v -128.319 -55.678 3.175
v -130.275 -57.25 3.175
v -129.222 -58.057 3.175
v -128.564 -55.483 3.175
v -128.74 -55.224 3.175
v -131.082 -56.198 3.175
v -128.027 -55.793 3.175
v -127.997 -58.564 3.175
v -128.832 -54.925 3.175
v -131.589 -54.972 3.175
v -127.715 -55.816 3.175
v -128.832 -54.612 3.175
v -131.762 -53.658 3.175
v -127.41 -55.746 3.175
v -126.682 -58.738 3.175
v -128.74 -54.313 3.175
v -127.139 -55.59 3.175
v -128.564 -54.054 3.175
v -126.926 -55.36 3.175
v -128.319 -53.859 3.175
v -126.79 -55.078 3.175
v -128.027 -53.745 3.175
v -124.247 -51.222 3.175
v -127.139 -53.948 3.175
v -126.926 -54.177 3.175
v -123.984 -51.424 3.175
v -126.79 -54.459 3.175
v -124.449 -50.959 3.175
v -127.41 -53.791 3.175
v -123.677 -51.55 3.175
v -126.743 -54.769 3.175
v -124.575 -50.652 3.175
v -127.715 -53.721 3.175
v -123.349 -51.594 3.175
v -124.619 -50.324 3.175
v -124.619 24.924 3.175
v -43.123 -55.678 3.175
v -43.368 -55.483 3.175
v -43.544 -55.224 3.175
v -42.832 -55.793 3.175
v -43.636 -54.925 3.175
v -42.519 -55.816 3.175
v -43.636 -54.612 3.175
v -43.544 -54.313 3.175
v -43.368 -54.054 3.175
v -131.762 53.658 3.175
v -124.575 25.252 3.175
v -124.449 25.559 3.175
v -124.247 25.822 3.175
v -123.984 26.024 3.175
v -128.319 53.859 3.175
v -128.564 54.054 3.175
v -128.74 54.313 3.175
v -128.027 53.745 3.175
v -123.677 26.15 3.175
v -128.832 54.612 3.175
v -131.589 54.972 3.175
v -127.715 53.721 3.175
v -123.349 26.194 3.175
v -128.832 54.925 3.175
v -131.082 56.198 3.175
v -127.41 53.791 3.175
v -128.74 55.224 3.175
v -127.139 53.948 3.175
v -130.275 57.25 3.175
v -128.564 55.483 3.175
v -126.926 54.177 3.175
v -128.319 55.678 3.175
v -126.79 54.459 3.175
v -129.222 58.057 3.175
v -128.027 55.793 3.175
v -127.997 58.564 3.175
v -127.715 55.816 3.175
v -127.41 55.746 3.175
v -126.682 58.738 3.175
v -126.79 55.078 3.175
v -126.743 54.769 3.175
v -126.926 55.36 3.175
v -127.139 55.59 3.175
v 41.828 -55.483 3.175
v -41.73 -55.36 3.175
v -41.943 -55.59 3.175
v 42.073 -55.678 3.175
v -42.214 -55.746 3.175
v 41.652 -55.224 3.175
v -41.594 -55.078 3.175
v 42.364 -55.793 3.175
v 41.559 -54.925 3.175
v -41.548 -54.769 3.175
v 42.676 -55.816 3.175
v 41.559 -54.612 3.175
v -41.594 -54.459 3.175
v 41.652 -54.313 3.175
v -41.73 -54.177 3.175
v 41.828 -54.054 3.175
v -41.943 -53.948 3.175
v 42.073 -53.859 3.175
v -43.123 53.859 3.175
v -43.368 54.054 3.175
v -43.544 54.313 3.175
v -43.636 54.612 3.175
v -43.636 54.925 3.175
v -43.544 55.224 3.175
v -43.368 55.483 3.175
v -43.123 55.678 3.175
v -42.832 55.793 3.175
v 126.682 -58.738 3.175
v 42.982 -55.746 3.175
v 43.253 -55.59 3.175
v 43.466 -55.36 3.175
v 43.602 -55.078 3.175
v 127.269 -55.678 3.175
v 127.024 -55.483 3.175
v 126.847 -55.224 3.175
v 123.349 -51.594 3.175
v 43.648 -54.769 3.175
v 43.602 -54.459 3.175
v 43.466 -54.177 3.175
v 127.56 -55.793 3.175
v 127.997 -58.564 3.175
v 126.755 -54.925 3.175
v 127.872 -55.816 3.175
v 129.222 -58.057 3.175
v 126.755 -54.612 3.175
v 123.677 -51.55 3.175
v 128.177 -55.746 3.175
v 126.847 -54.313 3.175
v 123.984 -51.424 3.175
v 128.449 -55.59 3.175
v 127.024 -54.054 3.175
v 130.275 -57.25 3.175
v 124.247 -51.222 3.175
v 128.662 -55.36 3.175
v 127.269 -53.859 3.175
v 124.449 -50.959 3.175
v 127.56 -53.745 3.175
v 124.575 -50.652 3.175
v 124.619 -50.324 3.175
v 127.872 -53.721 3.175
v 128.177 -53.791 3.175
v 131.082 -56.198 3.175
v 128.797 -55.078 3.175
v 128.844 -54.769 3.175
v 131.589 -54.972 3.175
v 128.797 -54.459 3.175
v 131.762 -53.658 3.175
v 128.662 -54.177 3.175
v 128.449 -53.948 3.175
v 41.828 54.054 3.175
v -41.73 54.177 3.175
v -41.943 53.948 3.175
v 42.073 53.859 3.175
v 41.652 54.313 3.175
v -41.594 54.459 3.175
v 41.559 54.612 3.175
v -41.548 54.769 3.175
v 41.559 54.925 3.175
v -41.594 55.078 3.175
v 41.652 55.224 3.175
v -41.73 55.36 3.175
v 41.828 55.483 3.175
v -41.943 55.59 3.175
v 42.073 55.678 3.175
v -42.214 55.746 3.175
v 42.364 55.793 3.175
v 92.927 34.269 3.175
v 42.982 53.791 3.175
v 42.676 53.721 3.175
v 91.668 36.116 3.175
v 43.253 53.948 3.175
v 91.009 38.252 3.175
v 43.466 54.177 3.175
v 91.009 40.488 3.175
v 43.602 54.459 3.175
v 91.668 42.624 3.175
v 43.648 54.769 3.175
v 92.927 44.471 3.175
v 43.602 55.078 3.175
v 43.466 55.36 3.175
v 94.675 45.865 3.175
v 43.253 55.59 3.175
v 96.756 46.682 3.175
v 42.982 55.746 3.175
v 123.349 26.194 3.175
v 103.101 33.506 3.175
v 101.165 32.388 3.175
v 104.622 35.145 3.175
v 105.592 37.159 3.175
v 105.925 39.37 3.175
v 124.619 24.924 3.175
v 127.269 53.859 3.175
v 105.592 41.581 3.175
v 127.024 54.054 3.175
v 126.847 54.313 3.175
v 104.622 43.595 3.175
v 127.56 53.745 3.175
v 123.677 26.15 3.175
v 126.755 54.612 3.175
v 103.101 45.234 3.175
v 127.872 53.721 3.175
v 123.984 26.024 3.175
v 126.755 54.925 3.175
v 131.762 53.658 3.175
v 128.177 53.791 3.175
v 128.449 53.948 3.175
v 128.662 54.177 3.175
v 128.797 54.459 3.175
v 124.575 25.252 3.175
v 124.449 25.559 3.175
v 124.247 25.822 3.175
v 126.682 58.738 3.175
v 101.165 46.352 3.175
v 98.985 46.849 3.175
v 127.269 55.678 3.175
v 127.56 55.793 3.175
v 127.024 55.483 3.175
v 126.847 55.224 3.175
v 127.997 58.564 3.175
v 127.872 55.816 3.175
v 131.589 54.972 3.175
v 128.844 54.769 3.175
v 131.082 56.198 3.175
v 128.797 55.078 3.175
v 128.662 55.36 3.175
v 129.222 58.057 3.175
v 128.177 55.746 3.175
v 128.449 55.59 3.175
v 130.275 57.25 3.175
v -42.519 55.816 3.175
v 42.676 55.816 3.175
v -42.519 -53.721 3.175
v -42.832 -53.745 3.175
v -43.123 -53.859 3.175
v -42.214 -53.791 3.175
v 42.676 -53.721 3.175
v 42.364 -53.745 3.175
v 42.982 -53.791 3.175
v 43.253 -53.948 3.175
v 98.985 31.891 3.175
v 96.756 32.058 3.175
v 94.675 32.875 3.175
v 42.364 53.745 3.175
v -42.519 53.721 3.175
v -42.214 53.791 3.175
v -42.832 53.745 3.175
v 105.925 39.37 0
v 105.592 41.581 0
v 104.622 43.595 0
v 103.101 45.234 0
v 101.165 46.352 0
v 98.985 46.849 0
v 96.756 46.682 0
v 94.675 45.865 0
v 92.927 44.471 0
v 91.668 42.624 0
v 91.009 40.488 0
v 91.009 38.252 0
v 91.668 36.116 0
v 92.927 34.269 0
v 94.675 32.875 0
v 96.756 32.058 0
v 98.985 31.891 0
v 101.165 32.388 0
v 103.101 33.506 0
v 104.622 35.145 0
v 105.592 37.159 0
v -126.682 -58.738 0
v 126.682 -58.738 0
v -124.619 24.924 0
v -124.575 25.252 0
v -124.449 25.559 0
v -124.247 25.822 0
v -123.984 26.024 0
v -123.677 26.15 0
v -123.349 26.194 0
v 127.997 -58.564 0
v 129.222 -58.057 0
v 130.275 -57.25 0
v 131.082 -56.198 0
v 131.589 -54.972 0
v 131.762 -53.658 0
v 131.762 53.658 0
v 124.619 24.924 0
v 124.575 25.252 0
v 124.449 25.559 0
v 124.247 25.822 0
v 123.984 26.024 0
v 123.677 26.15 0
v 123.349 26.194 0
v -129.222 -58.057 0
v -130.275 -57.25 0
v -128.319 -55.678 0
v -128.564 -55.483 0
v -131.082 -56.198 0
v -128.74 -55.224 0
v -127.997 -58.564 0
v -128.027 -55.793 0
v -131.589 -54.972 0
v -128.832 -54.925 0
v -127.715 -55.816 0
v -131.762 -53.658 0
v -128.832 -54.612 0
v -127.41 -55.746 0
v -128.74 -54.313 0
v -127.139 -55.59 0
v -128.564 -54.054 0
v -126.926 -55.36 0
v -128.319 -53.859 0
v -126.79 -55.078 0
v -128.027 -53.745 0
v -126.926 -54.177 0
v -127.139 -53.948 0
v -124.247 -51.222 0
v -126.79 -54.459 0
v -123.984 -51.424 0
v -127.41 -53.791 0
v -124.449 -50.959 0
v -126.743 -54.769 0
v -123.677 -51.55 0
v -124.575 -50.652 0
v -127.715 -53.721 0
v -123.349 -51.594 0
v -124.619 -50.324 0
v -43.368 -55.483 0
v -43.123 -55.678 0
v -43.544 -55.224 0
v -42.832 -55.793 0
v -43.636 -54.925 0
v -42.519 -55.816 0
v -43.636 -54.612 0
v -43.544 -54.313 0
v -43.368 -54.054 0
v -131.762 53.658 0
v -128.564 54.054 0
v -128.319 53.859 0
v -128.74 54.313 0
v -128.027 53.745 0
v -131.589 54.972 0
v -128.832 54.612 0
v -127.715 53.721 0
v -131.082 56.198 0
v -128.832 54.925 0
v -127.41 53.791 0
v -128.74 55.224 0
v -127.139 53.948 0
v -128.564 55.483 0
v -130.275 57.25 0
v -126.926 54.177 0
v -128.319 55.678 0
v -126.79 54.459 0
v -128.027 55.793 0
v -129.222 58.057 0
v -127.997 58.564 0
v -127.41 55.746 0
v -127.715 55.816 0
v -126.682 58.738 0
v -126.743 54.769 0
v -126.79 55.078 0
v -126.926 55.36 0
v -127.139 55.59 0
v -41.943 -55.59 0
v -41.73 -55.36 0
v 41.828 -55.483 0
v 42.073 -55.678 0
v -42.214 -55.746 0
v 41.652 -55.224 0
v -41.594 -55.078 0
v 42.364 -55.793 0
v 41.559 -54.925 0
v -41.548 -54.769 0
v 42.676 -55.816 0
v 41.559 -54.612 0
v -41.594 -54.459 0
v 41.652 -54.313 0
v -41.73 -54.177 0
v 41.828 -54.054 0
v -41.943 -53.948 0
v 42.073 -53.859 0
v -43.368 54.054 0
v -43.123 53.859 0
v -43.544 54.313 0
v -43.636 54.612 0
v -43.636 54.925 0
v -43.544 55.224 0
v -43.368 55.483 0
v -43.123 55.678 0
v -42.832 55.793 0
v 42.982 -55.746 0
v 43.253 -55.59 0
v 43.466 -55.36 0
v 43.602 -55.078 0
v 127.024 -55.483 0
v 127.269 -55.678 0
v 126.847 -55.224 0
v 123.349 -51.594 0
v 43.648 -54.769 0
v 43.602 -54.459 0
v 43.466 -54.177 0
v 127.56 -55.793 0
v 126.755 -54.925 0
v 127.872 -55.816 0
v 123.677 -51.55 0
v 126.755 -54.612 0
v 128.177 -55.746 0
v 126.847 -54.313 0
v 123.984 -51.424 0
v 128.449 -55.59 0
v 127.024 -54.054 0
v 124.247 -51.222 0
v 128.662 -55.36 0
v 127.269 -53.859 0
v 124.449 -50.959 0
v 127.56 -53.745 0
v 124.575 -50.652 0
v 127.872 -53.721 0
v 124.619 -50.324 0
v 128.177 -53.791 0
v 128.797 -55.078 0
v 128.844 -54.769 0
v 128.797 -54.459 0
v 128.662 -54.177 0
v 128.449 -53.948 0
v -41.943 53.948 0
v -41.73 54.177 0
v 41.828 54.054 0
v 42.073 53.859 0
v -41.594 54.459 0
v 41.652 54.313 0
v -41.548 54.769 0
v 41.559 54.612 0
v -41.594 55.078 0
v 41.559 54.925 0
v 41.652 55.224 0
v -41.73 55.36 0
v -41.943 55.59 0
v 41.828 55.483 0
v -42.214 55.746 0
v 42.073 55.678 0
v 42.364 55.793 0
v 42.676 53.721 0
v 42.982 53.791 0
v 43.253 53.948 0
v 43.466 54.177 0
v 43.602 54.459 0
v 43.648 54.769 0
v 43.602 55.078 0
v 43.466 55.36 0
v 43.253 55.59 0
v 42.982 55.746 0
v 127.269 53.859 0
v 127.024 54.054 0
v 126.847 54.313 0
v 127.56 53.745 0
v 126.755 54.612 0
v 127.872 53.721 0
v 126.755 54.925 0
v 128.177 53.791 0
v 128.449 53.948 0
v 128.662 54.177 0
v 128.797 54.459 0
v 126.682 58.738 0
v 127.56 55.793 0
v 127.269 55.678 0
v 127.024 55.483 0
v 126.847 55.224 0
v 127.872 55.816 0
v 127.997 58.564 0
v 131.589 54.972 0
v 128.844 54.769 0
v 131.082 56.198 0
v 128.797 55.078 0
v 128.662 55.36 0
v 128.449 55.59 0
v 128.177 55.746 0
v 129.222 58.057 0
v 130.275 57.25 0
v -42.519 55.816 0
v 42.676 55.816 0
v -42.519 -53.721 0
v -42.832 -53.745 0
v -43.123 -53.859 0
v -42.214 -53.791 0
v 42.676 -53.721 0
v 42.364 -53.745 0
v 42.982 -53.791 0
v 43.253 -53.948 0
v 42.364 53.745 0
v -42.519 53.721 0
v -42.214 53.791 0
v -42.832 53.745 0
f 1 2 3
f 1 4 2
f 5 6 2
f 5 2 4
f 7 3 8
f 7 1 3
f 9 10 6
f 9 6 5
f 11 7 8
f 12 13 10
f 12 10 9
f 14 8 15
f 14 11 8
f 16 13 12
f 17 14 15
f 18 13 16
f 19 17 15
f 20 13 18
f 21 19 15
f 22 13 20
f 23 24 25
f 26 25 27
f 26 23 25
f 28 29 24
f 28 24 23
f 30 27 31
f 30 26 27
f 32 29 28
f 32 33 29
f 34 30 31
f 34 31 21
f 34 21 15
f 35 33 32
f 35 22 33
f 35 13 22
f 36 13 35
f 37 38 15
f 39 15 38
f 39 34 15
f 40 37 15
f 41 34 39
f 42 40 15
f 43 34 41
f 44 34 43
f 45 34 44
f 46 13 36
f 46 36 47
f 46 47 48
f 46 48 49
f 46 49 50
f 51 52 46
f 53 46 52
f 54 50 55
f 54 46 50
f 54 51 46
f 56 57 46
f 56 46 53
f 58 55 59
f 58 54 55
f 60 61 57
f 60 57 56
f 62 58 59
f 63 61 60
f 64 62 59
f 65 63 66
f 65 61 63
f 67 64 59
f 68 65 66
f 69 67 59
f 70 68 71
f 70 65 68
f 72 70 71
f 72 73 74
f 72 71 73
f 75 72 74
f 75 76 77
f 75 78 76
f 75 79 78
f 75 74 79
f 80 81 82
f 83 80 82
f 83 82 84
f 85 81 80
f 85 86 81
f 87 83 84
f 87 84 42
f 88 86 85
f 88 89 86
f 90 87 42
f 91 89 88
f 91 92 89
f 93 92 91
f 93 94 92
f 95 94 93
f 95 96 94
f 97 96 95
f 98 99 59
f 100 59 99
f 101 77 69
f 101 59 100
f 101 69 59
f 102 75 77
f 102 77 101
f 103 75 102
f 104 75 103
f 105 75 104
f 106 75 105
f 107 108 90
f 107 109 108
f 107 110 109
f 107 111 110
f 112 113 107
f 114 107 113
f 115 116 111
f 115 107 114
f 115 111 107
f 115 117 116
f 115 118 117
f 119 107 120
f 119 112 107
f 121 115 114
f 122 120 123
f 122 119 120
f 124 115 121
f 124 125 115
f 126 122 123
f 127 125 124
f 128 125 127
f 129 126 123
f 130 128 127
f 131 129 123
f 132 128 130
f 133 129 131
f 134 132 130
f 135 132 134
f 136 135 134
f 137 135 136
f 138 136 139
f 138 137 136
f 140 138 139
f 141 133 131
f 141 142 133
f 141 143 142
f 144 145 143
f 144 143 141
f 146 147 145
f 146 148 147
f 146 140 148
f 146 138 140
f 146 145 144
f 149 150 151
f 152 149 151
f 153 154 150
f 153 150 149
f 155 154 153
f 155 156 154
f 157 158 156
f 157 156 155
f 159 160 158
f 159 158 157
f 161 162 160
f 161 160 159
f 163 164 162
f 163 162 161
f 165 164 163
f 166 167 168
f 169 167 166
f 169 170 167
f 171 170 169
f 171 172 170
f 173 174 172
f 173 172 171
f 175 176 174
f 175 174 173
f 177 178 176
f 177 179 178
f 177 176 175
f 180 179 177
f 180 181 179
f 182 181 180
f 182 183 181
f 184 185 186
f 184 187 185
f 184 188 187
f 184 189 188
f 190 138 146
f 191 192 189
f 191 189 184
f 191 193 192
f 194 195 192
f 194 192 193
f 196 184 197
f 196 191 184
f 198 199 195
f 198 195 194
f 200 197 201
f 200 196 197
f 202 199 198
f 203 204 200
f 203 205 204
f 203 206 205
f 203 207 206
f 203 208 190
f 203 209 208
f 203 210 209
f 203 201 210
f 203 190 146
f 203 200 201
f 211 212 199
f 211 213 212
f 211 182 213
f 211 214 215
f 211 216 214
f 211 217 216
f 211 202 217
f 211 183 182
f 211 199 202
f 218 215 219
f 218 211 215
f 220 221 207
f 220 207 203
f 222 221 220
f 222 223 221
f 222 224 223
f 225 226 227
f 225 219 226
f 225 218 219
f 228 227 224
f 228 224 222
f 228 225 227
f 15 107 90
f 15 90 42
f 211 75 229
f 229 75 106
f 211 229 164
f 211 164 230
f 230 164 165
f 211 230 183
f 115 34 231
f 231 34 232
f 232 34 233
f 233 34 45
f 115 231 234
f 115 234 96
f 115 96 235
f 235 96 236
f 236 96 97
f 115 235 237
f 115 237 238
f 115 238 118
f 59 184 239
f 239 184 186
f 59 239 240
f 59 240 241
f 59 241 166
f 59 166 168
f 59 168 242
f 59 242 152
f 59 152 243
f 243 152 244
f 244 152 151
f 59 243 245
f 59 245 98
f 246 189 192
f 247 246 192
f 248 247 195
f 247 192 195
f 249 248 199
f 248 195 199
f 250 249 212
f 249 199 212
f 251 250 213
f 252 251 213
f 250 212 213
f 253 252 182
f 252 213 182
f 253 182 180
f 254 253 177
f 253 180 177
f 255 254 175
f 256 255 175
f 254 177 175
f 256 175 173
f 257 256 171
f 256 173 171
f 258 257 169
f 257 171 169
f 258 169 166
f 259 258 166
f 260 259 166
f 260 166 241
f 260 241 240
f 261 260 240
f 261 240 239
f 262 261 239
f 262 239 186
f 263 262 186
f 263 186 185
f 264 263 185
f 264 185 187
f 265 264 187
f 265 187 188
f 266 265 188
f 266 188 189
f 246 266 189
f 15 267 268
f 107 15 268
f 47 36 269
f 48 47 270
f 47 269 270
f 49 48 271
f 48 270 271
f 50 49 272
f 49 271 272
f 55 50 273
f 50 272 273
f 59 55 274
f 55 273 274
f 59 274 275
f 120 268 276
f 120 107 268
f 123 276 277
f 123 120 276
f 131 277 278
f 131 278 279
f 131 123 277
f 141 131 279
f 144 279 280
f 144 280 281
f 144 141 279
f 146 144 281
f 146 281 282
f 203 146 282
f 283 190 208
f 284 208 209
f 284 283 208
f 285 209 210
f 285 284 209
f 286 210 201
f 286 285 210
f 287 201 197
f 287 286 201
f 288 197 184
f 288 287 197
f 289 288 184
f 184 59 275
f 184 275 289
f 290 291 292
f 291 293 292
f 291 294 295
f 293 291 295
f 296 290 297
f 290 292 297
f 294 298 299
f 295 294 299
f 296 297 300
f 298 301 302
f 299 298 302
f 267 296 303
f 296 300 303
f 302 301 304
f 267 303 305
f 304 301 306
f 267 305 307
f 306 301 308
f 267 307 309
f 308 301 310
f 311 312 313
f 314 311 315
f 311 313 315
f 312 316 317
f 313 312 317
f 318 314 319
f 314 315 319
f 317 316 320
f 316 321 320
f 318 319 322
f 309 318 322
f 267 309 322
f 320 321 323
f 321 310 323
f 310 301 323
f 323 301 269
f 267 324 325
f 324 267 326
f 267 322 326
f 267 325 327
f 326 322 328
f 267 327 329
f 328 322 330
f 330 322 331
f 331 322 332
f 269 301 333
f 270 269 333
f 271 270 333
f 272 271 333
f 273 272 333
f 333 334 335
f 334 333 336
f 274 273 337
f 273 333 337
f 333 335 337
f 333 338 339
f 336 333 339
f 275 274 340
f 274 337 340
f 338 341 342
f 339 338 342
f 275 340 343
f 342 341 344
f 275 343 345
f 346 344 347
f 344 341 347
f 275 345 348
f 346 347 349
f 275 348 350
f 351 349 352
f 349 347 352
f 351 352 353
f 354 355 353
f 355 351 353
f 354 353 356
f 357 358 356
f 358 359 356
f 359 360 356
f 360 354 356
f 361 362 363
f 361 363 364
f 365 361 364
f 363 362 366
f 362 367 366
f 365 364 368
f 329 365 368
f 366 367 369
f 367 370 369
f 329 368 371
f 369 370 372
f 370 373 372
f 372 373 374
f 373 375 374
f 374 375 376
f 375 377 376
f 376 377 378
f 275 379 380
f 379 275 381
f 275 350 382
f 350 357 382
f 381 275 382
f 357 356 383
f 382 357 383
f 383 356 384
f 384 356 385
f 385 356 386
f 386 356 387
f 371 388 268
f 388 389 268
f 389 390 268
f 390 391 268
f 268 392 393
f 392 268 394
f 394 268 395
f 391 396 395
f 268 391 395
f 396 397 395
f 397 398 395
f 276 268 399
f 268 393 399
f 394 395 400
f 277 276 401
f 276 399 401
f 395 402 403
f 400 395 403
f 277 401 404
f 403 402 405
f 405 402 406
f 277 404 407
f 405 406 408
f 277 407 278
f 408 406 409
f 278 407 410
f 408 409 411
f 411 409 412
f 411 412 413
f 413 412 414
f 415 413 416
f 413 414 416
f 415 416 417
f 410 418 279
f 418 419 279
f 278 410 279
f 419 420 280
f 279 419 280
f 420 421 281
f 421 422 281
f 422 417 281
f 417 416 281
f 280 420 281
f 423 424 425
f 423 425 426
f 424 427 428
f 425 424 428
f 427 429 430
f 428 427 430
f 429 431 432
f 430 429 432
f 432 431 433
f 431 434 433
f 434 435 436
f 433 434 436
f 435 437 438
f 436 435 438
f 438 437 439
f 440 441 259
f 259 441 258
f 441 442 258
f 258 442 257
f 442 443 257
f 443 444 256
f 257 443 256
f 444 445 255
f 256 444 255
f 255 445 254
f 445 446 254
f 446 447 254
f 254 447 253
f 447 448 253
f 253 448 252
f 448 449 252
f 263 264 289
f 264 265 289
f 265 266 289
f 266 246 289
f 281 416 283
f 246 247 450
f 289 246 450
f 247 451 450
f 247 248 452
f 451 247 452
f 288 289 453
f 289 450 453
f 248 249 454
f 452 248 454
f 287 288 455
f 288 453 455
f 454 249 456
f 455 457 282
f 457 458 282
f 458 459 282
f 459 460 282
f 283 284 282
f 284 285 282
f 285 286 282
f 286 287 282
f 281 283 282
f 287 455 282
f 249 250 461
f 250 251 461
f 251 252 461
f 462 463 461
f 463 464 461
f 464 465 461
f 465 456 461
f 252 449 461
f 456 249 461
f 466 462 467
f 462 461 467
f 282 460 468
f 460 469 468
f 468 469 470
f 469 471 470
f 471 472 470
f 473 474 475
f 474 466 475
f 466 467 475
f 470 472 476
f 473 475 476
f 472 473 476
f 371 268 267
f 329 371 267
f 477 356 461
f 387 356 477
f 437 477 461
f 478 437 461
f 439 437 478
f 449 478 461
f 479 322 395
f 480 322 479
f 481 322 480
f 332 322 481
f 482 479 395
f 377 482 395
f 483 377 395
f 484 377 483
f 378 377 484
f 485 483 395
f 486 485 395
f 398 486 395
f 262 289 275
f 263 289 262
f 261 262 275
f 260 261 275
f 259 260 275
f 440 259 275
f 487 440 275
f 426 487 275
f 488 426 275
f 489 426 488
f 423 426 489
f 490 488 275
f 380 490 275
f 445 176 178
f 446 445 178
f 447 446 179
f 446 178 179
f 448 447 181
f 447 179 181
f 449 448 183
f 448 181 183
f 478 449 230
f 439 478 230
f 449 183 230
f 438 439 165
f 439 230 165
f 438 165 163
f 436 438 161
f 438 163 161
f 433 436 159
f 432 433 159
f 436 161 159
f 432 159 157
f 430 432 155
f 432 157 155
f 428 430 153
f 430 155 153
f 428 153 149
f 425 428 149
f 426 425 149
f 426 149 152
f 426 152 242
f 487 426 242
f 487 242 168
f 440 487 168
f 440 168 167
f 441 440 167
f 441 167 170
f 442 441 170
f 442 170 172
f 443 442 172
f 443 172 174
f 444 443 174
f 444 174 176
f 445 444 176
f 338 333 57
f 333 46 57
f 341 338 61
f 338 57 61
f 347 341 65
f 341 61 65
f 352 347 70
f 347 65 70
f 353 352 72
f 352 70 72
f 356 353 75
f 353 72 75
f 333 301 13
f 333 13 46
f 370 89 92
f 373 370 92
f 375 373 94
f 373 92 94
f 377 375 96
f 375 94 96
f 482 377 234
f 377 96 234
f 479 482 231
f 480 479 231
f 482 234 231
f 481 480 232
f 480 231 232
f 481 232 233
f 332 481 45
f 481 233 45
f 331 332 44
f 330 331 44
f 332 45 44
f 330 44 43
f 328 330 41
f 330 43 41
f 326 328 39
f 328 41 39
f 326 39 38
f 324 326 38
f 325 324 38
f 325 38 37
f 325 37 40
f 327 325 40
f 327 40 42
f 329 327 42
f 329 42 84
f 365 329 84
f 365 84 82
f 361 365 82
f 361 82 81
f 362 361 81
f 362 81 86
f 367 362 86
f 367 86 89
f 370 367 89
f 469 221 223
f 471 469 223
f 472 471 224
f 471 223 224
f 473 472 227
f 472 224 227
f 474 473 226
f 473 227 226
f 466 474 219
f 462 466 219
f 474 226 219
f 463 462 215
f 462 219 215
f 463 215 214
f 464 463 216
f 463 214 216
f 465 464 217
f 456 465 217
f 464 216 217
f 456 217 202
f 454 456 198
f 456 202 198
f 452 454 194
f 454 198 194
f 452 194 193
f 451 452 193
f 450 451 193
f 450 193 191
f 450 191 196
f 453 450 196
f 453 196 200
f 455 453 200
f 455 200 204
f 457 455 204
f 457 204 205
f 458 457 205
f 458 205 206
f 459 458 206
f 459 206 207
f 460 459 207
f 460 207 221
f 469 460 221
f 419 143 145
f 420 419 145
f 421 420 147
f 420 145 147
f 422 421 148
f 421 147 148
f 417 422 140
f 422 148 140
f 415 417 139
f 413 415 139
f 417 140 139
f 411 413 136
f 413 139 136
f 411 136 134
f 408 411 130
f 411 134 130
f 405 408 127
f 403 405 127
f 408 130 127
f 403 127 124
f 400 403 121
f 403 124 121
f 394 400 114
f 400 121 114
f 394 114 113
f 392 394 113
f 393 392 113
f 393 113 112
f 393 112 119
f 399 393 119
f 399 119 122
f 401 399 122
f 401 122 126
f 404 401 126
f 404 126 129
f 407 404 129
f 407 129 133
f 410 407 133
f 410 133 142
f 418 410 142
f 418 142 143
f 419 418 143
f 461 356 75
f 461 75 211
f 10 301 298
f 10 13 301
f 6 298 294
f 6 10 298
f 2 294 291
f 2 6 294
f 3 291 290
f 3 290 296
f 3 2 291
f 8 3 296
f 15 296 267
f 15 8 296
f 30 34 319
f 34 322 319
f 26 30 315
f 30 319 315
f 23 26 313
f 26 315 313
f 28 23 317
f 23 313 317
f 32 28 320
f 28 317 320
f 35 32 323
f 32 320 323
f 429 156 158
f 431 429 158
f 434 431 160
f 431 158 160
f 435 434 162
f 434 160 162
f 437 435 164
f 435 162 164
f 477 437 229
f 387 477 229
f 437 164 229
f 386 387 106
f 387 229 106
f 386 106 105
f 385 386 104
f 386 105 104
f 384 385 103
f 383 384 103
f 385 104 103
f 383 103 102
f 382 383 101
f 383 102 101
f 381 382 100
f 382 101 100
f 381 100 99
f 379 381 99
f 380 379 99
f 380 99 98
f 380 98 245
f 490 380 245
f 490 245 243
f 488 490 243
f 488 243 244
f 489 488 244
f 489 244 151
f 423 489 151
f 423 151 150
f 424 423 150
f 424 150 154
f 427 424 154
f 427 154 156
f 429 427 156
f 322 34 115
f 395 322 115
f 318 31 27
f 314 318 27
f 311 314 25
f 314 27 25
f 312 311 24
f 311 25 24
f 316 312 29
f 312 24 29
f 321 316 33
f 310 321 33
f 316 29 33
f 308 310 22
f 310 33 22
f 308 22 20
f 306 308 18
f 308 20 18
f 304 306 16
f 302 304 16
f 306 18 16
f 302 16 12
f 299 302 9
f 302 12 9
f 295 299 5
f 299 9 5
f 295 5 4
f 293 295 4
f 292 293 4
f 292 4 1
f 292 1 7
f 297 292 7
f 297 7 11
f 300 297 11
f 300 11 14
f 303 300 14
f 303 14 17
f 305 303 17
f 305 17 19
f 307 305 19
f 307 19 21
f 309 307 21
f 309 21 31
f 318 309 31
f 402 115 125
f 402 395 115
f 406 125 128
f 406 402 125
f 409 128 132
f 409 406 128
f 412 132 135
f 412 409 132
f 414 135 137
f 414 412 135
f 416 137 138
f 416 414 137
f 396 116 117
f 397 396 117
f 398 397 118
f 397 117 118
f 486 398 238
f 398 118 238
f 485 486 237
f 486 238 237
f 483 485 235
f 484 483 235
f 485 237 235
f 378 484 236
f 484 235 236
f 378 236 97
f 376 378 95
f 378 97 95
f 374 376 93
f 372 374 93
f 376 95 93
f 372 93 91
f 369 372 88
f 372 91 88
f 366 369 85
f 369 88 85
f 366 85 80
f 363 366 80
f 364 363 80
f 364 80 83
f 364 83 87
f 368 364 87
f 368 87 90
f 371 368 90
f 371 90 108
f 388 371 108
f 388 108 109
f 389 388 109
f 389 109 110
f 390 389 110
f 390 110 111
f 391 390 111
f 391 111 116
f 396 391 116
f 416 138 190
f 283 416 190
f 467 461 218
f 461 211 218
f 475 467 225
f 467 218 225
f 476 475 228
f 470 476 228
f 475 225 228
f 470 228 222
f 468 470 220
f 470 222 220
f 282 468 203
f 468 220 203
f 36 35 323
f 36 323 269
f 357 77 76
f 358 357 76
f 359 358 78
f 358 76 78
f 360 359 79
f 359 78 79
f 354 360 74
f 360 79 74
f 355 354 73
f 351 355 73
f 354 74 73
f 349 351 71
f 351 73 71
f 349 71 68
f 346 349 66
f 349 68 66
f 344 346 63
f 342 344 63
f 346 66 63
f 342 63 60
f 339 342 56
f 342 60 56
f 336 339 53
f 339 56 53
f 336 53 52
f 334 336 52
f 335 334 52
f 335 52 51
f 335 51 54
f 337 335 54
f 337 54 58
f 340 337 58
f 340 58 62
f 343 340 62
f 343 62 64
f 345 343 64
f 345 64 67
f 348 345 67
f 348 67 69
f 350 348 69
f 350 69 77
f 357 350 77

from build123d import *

# Parameters (mm, degrees)
SKETCH_W        = 263.525
SKETCH_H        = 117.475
PAD_DEPTH       = 3.175
SKETCH002_W     = 249.2375
SKETCH002_H     = 77.7875
POCKET_DEPTH    = 3.176
SKETCH003_R     = 7.5
POCKET001_DEPTH = 3.176
SKETCH001_R     = 1.05029
HOLE_DEPTH      = 3.176
FILLET_R        = 5.08
FILLET001_R     = 1.27


with BuildPart() as part:
    # Sketch → Pad (new body)
    with BuildSketch(Plane.XY):
        Rectangle(SKETCH_W, SKETCH_H)
    extrude(amount=PAD_DEPTH)

    # Sketch002 (on Face6 of Pad) → Pocket (cut, through all)
    with BuildSketch(Plane.XY.offset(3.175)):
        with Locations((0, -12.7)):
            Rectangle(SKETCH002_W, SKETCH002_H)
    extrude(amount=-POCKET_DEPTH, mode=Mode.SUBTRACT)

    # Sketch003 (on Face5 of Pocket) → Pocket001 (cut, through all)
    with BuildSketch(Plane.XY.offset(3.175)):
        with Locations((98.425, 39.37)):
            Circle(SKETCH003_R)
    extrude(amount=-POCKET001_DEPTH, mode=Mode.SUBTRACT)

    # Sketch001 (on Face6 of Pad) → Hole (cut, through all)
    with BuildSketch(Plane.XY.offset(3.175)):
        with Locations((-42.597917, 54.76875)):
            Circle(SKETCH001_R)
        with Locations((42.597917, 54.76875)):
            Circle(SKETCH001_R)
        with Locations((42.597917, -54.76875)):
            Circle(SKETCH001_R)
        with Locations((-42.597917, -54.76875)):
            Circle(SKETCH001_R)
        with Locations((-127.79375, -54.76875)):
            Circle(SKETCH001_R)
        with Locations((-127.79375, 54.76875)):
            Circle(SKETCH001_R)
        with Locations((127.79375, 54.76875)):
            Circle(SKETCH001_R)
        with Locations((127.79375, -54.76875)):
            Circle(SKETCH001_R)
    extrude(amount=-HOLE_DEPTH, mode=Mode.SUBTRACT)

    # Fillet
    fillet_edges = [part.edges().sort_by_distance(p)[0] for p in [
        (-131.7625, 58.7375, 1.5875),
        (-131.7625, -58.7375, 1.5875),
        (131.7625, -58.7375, 1.5875),
        (131.7625, 58.7375, 1.5875),
    ]]
    fillet(fillet_edges, radius=FILLET_R)

    # Fillet001
    fillet001_edges = [part.edges().sort_by_distance(p)[0] for p in [
        (-124.61875, -51.59375, 1.5875),
        (-124.61875, 26.19375, 1.5875),
        (124.61875, 26.19375, 1.5875),
        (124.61875, -51.59375, 1.5875),
    ]]
    fillet(fillet001_edges, radius=FILLET001_R)


solid = part.part
